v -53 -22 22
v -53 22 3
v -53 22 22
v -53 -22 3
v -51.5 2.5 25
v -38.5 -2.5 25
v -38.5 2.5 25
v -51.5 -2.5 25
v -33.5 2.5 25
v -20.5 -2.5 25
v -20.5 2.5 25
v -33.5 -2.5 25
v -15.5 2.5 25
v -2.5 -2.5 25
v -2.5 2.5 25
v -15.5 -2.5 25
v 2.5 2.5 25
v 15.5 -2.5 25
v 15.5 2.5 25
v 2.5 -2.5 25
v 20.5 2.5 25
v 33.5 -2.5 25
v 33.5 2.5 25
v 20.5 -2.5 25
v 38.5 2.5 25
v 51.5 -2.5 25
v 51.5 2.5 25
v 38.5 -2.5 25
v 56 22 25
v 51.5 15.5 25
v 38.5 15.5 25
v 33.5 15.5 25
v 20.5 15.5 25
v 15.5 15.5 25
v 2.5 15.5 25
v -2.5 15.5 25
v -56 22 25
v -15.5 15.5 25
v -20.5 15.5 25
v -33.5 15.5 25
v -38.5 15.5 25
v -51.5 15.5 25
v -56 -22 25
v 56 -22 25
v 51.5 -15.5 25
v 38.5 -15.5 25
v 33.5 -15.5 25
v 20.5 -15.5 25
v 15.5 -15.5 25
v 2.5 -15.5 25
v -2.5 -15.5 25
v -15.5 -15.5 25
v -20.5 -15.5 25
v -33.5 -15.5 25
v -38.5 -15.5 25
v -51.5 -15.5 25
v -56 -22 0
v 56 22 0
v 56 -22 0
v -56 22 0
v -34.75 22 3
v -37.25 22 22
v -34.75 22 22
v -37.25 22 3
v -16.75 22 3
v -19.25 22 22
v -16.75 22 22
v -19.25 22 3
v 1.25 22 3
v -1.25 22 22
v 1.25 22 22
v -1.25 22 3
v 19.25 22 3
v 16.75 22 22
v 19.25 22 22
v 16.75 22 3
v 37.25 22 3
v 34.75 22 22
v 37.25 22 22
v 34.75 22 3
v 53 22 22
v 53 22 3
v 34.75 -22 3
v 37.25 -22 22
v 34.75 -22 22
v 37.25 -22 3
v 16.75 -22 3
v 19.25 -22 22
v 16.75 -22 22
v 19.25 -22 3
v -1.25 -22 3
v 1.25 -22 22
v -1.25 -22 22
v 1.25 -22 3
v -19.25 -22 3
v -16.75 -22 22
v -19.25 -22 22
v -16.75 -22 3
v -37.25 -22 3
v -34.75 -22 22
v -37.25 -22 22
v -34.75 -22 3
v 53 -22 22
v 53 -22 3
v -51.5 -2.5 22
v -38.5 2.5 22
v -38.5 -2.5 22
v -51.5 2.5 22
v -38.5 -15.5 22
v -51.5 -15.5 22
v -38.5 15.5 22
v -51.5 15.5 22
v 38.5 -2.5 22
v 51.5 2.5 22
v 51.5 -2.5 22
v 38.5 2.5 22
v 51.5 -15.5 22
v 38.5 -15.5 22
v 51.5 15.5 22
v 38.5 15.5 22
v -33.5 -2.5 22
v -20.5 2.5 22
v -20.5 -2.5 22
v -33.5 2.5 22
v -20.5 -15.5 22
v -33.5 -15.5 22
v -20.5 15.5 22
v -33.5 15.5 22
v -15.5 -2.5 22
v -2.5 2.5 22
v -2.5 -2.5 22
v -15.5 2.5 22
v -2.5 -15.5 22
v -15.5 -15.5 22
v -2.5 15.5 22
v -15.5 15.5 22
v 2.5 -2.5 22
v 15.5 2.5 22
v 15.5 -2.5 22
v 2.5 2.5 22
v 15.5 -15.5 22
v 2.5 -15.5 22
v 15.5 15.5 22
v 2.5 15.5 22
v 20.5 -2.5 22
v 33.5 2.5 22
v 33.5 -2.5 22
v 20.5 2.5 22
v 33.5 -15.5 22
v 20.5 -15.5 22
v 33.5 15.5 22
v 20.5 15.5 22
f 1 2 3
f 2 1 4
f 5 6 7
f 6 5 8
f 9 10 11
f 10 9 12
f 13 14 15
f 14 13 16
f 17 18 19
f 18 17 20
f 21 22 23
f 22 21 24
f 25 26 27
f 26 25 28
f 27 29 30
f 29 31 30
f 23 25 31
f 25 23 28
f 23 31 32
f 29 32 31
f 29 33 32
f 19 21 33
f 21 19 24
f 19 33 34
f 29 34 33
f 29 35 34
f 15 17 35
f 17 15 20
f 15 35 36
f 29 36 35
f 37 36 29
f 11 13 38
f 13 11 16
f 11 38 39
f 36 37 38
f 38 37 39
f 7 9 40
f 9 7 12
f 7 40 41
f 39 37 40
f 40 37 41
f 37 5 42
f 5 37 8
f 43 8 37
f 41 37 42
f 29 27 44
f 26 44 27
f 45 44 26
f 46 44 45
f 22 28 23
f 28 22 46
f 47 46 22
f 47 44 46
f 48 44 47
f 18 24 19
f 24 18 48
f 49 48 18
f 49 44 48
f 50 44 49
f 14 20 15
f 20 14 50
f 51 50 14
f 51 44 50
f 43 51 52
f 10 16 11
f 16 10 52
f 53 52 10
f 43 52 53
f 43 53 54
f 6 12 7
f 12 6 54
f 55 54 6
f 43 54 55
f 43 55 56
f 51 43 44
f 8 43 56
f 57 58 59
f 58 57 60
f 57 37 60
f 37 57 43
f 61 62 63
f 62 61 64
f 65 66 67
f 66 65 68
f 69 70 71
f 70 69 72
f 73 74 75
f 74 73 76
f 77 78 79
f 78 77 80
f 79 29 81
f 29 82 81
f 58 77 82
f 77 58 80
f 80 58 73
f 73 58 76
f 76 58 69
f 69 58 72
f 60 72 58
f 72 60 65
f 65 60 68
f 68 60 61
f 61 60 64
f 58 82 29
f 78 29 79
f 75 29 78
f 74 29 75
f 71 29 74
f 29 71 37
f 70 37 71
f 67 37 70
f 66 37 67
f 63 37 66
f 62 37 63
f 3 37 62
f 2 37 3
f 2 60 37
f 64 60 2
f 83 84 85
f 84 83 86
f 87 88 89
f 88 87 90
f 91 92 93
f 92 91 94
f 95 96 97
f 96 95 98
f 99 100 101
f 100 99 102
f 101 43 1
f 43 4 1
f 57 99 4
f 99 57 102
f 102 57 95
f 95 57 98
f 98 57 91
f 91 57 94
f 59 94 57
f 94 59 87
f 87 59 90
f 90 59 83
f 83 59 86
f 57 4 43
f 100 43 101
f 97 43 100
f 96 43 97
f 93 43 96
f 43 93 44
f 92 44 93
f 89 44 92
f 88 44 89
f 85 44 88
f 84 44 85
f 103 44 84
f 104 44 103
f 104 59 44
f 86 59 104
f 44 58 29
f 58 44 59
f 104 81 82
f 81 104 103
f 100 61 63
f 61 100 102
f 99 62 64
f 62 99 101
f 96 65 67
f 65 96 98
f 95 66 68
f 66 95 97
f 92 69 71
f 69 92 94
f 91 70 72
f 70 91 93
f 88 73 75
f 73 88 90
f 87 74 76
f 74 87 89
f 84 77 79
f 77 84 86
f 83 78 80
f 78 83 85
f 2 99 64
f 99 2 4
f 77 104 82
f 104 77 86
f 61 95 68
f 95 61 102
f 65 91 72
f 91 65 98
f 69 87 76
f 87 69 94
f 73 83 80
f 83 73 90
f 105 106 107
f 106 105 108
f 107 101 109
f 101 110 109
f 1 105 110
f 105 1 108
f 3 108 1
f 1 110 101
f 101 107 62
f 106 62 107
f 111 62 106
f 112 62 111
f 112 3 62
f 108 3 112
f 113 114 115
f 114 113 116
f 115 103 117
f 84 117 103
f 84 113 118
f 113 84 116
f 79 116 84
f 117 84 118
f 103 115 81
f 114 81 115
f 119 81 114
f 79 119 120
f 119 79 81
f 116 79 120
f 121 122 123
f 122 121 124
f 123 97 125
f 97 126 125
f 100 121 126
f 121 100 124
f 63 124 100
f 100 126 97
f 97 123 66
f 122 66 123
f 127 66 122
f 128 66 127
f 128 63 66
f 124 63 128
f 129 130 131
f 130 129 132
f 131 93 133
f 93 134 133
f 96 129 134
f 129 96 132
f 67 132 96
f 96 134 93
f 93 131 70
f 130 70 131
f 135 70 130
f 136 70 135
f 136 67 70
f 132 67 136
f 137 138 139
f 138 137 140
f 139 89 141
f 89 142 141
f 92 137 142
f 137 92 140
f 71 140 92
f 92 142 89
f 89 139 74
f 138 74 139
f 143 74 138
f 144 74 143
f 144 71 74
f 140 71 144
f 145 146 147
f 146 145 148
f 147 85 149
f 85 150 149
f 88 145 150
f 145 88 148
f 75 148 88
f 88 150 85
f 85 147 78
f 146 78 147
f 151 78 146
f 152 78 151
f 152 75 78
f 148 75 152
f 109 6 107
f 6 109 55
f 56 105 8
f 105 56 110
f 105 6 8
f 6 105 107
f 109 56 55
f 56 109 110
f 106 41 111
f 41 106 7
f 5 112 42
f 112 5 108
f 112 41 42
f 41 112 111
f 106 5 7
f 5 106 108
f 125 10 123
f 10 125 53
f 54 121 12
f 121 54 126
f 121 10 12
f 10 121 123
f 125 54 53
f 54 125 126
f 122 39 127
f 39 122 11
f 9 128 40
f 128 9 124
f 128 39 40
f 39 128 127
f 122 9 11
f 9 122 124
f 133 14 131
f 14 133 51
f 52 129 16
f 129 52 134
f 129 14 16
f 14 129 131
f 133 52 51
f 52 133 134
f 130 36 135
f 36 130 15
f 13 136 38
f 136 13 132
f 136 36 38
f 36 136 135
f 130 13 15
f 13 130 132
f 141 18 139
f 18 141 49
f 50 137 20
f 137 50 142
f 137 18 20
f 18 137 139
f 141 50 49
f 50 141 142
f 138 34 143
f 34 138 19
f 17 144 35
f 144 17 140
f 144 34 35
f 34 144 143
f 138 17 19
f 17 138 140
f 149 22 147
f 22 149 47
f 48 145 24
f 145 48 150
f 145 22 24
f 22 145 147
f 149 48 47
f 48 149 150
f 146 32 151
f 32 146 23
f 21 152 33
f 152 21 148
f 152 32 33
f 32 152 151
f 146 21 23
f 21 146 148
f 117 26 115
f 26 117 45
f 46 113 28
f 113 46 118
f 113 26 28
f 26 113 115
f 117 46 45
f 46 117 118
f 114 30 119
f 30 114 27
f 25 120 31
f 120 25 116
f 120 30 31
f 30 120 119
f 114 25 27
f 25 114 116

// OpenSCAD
// Open-sided 12-cuvette rack (print standing on base)

$fn = 64;

plate_x      = 112;   // plate length (X)
plate_y      = 44;    // plate depth (Y)
base_t       = 3;     // base plate thickness
deck_z0      = 22;    // deck bottom height
deck_z1      = 25;    // deck top height (= total height)
total_h      = 25;    // wall height
end_t        = 3;     // end wall thickness
rib_t        = 2.5;   // rib thickness
rib_xs       = [-36, -18, 0, 18, 36]; // rib centre positions
hole_size    = 13;    // square hole side
pitch        = 18;    // hole centre-to-centre (X and Y)
n_x          = 6;     // holes along X
n_y          = 2;     // holes along Y
eps          = 0.1;   // cutter overshoot

difference() {
    union() {
        // base plate
        translate([-plate_x/2, -plate_y/2, 0])
            cube([plate_x, plate_y, base_t]);
        // deck plate
        translate([-plate_x/2, -plate_y/2, deck_z0])
            cube([plate_x, plate_y, deck_z1 - deck_z0]);
        // end walls
        for (s = [-1, 1])
            translate([s*(plate_x/2 - end_t/2) - end_t/2, -plate_y/2, 0])
                cube([end_t, plate_y, total_h]);
        // ribs
        for (x = rib_xs)
            translate([x - rib_t/2, -plate_y/2, 0])
                cube([rib_t, plate_y, total_h]);
    }
    // deck through-holes
    for (i = [0 : n_x - 1])
        for (j = [0 : n_y - 1])
            translate([(i - (n_x - 1)/2) * pitch - hole_size/2,
                       (j - (n_y - 1)/2) * pitch - hole_size/2,
                       deck_z0 - eps])
                cube([hole_size, hole_size, deck_z1 - deck_z0 + 2*eps]);
}
